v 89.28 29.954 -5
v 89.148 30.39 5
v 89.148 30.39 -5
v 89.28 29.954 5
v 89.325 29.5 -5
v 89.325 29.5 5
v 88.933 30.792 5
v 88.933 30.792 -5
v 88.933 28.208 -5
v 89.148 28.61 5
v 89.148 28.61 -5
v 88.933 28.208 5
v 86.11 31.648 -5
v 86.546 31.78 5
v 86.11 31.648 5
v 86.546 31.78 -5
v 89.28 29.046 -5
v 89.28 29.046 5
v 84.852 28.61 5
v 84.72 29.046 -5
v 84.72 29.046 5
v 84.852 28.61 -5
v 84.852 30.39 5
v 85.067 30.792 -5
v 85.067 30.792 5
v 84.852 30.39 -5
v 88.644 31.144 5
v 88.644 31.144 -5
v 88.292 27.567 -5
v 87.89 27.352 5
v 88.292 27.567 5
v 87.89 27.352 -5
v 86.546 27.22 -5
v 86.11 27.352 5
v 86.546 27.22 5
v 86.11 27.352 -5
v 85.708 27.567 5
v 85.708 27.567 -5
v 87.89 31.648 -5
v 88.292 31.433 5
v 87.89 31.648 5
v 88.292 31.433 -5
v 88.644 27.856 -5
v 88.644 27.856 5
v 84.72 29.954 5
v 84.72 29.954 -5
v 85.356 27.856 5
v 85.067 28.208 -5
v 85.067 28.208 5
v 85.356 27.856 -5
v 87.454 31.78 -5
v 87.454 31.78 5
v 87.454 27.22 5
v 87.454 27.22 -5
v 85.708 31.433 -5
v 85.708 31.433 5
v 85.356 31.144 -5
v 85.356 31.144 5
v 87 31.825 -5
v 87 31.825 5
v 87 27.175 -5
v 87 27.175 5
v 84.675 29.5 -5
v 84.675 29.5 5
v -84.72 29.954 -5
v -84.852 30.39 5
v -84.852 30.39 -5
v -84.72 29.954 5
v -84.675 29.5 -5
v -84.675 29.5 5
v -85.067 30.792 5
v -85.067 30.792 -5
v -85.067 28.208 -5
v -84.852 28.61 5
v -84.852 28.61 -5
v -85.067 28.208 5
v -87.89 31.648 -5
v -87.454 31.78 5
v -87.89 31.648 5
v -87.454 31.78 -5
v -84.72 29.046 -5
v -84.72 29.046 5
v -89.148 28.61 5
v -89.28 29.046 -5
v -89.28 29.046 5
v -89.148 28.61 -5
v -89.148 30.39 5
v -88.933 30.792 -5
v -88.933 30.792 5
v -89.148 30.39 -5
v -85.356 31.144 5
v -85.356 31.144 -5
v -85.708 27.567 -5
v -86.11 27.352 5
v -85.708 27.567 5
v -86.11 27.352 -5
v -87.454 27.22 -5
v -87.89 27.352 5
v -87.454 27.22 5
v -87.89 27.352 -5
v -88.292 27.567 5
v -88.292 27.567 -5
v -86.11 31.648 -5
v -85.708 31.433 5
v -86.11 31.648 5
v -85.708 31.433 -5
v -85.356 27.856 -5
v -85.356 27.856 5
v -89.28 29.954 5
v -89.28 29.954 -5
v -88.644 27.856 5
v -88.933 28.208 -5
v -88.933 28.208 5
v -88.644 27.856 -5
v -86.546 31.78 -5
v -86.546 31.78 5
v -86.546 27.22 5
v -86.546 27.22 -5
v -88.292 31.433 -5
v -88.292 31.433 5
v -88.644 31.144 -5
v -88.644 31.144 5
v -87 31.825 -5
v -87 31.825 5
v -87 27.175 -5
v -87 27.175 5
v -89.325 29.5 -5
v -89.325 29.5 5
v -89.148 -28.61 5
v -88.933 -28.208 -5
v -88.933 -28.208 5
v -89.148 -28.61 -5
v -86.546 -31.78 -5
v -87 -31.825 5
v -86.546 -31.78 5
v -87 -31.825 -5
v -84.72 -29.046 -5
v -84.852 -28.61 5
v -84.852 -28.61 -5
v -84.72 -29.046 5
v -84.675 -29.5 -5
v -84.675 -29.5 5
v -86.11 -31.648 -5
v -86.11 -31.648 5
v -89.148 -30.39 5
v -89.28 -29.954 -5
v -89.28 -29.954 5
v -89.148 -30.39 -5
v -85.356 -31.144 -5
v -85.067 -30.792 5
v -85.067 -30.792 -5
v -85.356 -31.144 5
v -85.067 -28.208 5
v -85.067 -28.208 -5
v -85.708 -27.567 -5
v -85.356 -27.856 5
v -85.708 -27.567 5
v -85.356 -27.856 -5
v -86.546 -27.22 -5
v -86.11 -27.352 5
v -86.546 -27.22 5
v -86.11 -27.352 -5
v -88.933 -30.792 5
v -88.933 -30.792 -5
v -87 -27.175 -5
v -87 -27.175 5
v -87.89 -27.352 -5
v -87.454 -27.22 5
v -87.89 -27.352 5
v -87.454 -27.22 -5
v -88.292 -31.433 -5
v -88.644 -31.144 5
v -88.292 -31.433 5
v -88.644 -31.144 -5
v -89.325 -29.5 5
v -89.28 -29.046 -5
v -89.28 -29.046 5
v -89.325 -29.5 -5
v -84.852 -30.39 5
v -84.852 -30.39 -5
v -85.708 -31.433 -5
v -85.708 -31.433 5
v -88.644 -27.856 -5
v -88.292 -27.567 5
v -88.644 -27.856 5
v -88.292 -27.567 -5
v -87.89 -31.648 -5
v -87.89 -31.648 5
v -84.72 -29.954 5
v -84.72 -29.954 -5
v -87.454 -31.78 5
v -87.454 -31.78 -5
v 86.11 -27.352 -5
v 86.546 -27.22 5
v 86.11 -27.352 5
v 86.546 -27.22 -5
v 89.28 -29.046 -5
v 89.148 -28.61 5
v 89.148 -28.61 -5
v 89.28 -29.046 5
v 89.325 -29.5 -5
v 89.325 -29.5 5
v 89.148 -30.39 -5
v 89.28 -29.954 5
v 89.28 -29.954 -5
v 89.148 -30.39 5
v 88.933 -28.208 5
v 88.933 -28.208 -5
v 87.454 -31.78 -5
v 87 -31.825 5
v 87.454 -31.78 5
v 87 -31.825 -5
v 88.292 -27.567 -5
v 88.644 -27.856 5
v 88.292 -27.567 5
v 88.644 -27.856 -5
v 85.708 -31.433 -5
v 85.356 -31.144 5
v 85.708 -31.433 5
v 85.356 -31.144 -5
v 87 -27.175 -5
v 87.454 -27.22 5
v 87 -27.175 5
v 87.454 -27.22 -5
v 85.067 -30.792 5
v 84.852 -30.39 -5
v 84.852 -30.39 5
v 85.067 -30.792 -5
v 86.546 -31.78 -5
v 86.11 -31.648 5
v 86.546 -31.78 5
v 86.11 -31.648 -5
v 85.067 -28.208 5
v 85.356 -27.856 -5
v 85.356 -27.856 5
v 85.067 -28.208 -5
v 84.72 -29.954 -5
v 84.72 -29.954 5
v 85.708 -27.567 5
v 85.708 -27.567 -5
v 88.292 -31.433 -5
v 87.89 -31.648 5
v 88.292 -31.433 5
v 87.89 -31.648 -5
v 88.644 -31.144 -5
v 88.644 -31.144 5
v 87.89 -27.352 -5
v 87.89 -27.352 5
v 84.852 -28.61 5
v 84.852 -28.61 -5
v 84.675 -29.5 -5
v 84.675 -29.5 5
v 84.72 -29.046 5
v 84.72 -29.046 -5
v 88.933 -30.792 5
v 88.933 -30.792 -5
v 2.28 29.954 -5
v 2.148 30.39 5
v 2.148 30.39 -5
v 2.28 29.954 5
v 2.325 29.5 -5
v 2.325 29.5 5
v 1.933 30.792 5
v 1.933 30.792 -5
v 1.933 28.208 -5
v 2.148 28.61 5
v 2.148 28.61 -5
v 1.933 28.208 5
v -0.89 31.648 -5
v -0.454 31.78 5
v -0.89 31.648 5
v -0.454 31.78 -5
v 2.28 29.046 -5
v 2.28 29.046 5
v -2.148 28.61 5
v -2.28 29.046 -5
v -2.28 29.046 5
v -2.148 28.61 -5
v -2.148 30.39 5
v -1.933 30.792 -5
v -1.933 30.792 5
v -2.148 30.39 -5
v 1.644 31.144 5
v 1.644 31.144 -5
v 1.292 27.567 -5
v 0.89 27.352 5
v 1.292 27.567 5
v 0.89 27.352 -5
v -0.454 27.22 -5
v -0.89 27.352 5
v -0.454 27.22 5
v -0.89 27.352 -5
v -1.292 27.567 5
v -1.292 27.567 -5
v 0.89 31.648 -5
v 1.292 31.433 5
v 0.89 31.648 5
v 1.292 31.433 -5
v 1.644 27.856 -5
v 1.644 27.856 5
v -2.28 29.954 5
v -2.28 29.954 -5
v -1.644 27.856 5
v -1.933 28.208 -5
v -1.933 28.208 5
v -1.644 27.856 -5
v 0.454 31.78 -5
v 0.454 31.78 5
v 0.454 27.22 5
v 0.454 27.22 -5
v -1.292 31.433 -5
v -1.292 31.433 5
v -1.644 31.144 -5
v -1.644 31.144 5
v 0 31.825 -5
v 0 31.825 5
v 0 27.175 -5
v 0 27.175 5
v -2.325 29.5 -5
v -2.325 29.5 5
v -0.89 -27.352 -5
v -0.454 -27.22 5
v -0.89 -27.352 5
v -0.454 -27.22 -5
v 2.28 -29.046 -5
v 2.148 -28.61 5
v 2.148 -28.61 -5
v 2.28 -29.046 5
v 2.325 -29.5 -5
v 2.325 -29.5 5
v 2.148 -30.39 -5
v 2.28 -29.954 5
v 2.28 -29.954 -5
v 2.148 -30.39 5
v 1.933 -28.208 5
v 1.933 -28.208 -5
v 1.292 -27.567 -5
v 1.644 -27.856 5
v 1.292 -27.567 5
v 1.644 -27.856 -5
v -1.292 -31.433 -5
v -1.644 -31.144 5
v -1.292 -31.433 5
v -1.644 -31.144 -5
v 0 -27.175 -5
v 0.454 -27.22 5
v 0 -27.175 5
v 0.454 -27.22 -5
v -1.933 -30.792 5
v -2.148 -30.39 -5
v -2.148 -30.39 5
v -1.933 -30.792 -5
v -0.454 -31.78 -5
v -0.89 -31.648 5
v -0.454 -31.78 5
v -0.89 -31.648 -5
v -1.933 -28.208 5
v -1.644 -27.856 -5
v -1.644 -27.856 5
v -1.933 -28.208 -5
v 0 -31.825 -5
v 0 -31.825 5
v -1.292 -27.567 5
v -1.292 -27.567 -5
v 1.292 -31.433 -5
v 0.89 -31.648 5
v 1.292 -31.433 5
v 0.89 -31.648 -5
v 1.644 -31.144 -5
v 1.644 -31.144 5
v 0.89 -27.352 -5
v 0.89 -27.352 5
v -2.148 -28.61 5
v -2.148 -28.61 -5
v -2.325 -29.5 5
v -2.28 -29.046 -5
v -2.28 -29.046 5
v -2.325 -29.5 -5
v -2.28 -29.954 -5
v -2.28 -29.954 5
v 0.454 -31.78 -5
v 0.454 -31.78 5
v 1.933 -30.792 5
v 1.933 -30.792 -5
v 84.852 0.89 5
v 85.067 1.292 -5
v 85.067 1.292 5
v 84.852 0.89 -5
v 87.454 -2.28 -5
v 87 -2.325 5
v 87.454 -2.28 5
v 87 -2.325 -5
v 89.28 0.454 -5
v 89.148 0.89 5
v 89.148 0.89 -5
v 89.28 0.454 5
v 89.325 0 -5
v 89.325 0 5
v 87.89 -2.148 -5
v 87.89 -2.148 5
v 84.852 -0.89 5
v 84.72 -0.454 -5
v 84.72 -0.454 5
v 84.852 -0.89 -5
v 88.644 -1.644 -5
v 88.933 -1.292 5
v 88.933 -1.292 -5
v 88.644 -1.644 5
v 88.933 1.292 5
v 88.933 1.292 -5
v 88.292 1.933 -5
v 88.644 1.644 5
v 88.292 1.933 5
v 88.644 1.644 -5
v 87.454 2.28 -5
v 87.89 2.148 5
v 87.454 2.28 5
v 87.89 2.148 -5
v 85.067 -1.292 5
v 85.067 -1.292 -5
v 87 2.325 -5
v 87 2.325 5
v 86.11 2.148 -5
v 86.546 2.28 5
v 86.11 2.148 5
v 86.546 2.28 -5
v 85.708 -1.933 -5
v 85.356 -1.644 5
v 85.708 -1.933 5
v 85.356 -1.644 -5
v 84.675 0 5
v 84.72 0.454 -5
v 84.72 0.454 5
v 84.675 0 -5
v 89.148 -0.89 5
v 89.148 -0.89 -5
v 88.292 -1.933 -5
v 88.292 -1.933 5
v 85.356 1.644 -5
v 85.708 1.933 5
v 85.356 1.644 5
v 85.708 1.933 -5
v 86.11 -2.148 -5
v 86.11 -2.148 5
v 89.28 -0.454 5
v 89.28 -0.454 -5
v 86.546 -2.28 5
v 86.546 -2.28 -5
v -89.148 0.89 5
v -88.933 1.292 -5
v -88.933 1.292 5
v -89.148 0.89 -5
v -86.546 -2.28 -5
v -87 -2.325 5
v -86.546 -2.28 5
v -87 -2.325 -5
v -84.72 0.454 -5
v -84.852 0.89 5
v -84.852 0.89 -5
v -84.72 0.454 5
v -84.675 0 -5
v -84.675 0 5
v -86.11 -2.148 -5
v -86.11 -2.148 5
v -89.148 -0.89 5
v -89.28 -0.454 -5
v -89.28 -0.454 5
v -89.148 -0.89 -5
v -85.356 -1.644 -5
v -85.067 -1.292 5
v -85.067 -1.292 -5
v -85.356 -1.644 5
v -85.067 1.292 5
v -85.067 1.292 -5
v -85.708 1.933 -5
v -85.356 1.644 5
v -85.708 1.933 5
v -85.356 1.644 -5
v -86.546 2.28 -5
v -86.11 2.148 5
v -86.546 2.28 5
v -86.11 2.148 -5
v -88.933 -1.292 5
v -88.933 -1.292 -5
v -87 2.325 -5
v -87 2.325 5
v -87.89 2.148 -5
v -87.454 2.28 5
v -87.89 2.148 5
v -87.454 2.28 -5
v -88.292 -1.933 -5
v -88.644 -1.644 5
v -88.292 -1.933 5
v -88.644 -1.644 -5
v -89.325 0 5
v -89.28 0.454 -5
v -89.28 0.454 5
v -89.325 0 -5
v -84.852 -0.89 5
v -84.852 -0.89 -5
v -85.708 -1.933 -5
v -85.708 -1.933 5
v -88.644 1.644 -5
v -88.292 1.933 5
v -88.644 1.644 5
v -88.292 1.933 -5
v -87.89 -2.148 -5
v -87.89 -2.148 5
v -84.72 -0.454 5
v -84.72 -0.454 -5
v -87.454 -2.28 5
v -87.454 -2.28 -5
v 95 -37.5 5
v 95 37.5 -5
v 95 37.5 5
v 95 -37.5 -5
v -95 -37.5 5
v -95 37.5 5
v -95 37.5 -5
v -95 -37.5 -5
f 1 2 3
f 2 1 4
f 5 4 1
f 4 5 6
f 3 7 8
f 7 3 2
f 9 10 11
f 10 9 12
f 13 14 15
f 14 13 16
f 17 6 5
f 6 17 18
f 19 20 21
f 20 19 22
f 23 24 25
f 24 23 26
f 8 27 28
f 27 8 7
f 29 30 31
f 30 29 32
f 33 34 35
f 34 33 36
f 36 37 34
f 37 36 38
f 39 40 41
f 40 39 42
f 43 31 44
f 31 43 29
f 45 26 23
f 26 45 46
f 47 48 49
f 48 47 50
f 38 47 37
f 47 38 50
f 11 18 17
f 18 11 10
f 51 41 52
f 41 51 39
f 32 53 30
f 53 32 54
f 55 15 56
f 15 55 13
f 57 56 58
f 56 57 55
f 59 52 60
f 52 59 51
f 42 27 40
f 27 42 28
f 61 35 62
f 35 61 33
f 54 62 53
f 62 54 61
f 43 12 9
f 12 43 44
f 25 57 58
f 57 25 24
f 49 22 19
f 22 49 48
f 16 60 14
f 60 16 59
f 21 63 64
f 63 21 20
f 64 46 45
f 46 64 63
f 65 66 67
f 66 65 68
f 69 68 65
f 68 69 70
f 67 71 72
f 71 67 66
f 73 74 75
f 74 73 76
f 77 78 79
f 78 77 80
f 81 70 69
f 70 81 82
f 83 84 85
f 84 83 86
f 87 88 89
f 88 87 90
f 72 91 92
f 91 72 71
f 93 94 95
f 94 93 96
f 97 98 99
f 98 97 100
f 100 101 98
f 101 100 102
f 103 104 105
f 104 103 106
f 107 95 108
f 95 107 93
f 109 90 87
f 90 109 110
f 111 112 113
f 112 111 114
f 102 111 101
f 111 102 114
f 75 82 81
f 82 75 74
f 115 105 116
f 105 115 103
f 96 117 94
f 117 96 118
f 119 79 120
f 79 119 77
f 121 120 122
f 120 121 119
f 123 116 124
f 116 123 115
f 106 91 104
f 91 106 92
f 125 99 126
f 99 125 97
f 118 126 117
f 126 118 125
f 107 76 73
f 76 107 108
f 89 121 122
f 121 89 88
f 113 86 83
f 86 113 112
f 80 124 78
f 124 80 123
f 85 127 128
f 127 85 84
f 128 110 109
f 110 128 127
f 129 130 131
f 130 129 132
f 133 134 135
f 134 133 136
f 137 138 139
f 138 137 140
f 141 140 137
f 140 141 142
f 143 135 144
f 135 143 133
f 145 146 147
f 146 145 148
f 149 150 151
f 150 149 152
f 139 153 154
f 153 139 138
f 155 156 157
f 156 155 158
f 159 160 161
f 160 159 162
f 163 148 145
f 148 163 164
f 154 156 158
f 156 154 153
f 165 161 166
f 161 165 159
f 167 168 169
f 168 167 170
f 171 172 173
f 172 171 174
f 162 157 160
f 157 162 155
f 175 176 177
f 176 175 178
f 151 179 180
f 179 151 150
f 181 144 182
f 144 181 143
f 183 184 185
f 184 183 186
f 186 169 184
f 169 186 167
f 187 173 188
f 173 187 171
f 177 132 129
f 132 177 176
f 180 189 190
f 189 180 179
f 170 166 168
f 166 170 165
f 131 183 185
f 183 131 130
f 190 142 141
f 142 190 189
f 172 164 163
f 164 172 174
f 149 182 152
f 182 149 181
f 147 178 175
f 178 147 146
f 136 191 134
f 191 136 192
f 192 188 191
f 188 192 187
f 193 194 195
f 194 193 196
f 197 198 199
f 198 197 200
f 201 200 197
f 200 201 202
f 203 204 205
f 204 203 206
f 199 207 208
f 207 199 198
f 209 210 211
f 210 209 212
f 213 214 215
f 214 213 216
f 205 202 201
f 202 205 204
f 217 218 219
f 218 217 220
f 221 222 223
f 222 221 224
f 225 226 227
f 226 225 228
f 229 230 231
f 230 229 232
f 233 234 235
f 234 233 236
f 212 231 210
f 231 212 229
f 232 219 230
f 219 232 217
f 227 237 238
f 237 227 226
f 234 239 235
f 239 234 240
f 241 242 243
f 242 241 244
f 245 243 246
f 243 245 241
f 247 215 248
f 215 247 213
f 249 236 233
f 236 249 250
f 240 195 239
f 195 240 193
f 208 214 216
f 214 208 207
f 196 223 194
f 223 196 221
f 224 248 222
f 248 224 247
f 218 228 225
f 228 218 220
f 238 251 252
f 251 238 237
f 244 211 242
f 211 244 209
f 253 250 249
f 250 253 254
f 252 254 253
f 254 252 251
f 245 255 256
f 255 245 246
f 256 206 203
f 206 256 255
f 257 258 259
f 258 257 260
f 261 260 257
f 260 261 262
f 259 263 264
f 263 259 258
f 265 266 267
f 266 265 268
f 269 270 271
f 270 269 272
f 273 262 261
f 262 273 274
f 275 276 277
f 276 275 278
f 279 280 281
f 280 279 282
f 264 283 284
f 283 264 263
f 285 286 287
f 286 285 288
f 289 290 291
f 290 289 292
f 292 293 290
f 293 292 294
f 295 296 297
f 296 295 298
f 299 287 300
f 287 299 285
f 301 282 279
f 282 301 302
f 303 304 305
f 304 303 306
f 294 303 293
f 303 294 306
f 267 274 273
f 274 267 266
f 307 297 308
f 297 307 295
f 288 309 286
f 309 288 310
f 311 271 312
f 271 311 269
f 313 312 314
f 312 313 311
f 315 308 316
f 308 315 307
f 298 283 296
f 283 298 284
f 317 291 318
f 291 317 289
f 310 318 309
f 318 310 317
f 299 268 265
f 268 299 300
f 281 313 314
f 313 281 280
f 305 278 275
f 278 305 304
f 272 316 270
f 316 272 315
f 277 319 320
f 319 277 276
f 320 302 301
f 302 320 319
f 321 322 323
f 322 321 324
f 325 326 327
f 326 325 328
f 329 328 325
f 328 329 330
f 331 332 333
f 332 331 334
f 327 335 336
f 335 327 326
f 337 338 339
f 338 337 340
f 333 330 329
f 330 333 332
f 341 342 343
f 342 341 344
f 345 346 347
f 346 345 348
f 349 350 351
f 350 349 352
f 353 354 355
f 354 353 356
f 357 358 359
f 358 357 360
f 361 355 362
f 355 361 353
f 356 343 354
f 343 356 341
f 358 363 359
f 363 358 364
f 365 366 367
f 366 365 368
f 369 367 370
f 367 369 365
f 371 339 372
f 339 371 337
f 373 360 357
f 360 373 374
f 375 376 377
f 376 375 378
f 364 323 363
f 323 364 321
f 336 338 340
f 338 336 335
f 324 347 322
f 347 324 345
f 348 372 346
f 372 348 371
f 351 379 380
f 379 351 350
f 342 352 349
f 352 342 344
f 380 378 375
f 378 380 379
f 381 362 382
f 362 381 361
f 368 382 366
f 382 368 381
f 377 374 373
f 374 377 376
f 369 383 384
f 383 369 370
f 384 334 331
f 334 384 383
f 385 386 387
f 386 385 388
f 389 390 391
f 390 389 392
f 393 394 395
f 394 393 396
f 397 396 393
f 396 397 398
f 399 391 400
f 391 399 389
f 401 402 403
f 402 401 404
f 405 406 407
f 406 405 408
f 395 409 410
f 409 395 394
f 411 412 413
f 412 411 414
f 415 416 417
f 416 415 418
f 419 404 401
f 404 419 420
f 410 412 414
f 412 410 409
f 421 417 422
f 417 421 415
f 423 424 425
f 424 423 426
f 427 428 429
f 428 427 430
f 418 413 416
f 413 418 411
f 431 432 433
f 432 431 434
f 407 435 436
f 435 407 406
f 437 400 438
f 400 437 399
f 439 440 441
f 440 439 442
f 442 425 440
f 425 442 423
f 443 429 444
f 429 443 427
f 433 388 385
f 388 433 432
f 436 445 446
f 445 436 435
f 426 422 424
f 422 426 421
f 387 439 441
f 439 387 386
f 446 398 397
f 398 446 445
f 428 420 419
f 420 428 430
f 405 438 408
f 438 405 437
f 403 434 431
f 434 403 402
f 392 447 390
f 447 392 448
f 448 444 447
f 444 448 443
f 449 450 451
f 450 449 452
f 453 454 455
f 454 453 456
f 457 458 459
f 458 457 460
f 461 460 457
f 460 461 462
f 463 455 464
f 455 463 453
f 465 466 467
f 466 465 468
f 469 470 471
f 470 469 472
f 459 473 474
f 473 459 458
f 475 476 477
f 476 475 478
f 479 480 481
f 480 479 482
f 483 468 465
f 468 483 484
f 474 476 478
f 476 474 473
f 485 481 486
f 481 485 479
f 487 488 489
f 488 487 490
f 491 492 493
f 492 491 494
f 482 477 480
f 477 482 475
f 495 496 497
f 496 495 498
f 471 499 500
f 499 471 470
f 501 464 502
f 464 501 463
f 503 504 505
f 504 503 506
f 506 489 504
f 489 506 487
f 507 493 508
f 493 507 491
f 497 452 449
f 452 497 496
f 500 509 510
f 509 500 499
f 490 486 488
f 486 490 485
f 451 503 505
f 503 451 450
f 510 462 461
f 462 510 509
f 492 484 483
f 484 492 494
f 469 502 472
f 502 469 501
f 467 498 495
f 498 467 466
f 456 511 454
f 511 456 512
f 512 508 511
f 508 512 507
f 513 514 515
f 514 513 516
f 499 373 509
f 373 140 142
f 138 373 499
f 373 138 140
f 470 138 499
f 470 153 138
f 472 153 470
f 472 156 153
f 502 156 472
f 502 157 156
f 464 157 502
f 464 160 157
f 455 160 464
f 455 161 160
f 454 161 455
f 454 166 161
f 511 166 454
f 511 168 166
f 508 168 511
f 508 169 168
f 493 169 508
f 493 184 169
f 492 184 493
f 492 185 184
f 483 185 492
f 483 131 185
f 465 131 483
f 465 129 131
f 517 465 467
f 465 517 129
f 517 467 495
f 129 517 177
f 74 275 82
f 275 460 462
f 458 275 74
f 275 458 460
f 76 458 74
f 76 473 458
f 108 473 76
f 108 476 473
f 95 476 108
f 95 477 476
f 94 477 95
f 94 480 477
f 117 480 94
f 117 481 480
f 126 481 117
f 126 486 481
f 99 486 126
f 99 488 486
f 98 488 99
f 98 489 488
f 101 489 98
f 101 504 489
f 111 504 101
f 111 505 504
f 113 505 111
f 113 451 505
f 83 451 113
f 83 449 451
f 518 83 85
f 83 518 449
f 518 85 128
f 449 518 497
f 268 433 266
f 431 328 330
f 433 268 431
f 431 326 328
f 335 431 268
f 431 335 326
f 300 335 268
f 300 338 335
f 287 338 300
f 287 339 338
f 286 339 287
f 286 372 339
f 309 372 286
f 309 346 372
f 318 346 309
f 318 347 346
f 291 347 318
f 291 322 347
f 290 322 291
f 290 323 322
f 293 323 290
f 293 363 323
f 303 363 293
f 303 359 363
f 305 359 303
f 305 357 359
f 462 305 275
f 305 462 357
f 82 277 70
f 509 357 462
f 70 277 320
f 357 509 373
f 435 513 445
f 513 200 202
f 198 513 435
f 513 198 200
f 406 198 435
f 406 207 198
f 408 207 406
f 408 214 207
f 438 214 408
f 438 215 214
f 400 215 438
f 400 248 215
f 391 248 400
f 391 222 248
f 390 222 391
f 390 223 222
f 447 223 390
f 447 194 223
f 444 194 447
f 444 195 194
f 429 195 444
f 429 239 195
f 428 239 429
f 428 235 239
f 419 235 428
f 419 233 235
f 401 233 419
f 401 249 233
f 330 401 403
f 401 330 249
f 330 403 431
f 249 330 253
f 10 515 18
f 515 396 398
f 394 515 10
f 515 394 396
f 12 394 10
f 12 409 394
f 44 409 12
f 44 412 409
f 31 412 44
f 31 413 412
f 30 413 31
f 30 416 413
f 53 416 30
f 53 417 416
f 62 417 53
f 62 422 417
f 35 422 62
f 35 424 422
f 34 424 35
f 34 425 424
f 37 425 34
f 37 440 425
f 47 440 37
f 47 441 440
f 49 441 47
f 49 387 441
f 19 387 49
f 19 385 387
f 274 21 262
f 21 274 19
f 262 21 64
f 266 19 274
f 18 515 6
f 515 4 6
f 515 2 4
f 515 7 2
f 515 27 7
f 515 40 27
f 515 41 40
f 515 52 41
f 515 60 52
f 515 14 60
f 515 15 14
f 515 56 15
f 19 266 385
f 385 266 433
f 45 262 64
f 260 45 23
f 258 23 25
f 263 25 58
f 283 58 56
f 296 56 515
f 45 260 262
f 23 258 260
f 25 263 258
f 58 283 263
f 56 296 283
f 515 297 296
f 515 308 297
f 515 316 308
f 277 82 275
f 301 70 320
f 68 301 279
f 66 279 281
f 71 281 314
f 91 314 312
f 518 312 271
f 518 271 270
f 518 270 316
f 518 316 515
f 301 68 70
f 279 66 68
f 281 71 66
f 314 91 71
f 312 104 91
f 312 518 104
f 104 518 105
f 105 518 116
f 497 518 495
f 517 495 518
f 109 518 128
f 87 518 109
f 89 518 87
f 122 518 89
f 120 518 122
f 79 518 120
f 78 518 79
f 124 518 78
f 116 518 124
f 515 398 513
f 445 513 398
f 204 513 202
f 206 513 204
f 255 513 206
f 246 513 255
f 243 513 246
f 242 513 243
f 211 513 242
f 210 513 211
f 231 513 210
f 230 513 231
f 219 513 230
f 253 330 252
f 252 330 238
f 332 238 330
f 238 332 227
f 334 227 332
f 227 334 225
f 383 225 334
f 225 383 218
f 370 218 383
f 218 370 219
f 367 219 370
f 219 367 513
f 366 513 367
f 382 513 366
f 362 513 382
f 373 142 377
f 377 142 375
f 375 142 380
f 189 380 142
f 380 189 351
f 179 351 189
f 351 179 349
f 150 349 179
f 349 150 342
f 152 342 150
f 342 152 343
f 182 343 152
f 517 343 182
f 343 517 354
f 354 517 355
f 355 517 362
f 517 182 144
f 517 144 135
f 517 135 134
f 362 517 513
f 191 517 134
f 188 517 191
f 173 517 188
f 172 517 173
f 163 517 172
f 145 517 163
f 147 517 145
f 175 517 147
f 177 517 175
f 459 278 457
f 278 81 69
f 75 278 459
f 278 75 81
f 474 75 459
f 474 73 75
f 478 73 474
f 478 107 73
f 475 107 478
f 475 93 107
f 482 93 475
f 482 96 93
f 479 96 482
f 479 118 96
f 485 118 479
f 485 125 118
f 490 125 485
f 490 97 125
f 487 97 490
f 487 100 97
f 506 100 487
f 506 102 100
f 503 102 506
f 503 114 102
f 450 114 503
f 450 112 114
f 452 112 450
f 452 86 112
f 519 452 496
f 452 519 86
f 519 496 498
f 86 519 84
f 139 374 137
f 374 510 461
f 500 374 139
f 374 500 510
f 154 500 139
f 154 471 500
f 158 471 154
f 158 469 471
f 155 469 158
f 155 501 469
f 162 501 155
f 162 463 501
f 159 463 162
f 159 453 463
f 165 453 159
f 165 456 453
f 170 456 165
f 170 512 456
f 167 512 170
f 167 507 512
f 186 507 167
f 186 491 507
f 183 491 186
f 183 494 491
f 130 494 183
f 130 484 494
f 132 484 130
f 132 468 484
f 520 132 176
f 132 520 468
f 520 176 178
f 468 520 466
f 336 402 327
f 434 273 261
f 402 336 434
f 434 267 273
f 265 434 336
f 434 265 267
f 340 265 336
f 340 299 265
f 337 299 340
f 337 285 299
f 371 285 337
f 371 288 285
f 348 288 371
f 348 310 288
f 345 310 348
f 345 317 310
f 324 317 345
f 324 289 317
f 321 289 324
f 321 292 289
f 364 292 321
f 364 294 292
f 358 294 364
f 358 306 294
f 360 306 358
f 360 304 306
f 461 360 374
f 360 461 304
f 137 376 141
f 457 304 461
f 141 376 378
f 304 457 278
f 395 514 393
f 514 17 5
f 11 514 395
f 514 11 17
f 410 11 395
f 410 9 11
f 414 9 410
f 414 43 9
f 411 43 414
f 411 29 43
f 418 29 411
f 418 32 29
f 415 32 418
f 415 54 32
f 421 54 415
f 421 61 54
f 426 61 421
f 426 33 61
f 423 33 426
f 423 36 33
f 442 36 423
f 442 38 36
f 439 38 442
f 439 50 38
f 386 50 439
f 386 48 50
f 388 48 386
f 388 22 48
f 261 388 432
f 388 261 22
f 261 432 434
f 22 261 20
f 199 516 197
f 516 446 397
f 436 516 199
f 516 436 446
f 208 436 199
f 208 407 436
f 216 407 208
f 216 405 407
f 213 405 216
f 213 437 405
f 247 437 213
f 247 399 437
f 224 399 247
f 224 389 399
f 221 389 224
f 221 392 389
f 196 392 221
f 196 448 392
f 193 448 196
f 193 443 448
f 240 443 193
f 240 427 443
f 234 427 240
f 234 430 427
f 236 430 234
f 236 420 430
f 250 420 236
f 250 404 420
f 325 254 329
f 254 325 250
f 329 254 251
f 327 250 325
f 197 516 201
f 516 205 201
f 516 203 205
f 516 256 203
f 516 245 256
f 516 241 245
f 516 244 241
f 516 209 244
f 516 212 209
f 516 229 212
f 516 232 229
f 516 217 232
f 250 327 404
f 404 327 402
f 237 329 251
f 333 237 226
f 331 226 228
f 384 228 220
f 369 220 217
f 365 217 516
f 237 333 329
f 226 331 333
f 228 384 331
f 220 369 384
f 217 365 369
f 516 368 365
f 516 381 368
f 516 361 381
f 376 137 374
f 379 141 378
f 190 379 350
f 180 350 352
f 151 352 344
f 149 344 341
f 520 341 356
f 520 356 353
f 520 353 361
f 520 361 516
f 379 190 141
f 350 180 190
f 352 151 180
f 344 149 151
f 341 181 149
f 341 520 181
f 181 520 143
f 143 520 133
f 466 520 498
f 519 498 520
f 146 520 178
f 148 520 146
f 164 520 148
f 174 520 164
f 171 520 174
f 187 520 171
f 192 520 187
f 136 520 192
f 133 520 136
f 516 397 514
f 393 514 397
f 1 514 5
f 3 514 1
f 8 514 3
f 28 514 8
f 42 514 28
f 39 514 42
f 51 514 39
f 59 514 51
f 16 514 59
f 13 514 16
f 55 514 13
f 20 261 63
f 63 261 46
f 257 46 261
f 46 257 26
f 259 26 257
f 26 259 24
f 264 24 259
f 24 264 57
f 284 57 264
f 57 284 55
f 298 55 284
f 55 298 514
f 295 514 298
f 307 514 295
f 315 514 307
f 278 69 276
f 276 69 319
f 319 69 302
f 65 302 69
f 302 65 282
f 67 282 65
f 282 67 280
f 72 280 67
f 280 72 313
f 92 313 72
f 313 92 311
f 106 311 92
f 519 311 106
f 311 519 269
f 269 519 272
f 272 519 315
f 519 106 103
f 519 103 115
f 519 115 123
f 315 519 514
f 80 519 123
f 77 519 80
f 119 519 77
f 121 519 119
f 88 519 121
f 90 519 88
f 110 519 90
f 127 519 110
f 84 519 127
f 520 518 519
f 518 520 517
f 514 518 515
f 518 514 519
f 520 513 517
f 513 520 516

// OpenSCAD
$fn = 32;

// ----------------------------------------------------------------------
// Corner plate 190 x 75 x 10
// 8 holes, centres taken from the edge offset
// ----------------------------------------------------------------------

// --- parameters (mm) ---
plate = [190, 75, 10];   // overall size (x, y, z)
seat_tol = 0.1;          // tolerance at the seating features
free_tol = 0.3;          // general tolerance on the free sizes
holes = 8;               // number of holes the drawing asks for
bore_d = 4.5;            // nominal hole diameter from the drawing
print_allowance = 0.15;  // clearance added for printing
edge = 8;                // hole centre offset from the plate edge

// --- derived feature positions (mm) ---
hole_d = bore_d + print_allowance;  // = 4.65   hole diameter as printed
corner_x = plate[0] / 2 - edge;     // = 87   corner hole X
corner_y = plate[1] / 2 - edge;     // = 29.5   corner hole Y
feature_centers = [
  [corner_x, corner_y],
  [-corner_x, corner_y],
  [-corner_x, -corner_y],
  [corner_x, -corner_y],
  [0, corner_y],
  [0, -corner_y],
  [corner_x, 0],
  [-corner_x, 0]
];   // hole centres the loop below drills

// plate outline, every hole drilled through with the same cutters
difference() {
  cube(plate, center = true);
  for (centre = feature_centers)
    translate([centre[0], centre[1], 0])
      cylinder(d = hole_d, h = plate[2] + 2, center = true);
}
